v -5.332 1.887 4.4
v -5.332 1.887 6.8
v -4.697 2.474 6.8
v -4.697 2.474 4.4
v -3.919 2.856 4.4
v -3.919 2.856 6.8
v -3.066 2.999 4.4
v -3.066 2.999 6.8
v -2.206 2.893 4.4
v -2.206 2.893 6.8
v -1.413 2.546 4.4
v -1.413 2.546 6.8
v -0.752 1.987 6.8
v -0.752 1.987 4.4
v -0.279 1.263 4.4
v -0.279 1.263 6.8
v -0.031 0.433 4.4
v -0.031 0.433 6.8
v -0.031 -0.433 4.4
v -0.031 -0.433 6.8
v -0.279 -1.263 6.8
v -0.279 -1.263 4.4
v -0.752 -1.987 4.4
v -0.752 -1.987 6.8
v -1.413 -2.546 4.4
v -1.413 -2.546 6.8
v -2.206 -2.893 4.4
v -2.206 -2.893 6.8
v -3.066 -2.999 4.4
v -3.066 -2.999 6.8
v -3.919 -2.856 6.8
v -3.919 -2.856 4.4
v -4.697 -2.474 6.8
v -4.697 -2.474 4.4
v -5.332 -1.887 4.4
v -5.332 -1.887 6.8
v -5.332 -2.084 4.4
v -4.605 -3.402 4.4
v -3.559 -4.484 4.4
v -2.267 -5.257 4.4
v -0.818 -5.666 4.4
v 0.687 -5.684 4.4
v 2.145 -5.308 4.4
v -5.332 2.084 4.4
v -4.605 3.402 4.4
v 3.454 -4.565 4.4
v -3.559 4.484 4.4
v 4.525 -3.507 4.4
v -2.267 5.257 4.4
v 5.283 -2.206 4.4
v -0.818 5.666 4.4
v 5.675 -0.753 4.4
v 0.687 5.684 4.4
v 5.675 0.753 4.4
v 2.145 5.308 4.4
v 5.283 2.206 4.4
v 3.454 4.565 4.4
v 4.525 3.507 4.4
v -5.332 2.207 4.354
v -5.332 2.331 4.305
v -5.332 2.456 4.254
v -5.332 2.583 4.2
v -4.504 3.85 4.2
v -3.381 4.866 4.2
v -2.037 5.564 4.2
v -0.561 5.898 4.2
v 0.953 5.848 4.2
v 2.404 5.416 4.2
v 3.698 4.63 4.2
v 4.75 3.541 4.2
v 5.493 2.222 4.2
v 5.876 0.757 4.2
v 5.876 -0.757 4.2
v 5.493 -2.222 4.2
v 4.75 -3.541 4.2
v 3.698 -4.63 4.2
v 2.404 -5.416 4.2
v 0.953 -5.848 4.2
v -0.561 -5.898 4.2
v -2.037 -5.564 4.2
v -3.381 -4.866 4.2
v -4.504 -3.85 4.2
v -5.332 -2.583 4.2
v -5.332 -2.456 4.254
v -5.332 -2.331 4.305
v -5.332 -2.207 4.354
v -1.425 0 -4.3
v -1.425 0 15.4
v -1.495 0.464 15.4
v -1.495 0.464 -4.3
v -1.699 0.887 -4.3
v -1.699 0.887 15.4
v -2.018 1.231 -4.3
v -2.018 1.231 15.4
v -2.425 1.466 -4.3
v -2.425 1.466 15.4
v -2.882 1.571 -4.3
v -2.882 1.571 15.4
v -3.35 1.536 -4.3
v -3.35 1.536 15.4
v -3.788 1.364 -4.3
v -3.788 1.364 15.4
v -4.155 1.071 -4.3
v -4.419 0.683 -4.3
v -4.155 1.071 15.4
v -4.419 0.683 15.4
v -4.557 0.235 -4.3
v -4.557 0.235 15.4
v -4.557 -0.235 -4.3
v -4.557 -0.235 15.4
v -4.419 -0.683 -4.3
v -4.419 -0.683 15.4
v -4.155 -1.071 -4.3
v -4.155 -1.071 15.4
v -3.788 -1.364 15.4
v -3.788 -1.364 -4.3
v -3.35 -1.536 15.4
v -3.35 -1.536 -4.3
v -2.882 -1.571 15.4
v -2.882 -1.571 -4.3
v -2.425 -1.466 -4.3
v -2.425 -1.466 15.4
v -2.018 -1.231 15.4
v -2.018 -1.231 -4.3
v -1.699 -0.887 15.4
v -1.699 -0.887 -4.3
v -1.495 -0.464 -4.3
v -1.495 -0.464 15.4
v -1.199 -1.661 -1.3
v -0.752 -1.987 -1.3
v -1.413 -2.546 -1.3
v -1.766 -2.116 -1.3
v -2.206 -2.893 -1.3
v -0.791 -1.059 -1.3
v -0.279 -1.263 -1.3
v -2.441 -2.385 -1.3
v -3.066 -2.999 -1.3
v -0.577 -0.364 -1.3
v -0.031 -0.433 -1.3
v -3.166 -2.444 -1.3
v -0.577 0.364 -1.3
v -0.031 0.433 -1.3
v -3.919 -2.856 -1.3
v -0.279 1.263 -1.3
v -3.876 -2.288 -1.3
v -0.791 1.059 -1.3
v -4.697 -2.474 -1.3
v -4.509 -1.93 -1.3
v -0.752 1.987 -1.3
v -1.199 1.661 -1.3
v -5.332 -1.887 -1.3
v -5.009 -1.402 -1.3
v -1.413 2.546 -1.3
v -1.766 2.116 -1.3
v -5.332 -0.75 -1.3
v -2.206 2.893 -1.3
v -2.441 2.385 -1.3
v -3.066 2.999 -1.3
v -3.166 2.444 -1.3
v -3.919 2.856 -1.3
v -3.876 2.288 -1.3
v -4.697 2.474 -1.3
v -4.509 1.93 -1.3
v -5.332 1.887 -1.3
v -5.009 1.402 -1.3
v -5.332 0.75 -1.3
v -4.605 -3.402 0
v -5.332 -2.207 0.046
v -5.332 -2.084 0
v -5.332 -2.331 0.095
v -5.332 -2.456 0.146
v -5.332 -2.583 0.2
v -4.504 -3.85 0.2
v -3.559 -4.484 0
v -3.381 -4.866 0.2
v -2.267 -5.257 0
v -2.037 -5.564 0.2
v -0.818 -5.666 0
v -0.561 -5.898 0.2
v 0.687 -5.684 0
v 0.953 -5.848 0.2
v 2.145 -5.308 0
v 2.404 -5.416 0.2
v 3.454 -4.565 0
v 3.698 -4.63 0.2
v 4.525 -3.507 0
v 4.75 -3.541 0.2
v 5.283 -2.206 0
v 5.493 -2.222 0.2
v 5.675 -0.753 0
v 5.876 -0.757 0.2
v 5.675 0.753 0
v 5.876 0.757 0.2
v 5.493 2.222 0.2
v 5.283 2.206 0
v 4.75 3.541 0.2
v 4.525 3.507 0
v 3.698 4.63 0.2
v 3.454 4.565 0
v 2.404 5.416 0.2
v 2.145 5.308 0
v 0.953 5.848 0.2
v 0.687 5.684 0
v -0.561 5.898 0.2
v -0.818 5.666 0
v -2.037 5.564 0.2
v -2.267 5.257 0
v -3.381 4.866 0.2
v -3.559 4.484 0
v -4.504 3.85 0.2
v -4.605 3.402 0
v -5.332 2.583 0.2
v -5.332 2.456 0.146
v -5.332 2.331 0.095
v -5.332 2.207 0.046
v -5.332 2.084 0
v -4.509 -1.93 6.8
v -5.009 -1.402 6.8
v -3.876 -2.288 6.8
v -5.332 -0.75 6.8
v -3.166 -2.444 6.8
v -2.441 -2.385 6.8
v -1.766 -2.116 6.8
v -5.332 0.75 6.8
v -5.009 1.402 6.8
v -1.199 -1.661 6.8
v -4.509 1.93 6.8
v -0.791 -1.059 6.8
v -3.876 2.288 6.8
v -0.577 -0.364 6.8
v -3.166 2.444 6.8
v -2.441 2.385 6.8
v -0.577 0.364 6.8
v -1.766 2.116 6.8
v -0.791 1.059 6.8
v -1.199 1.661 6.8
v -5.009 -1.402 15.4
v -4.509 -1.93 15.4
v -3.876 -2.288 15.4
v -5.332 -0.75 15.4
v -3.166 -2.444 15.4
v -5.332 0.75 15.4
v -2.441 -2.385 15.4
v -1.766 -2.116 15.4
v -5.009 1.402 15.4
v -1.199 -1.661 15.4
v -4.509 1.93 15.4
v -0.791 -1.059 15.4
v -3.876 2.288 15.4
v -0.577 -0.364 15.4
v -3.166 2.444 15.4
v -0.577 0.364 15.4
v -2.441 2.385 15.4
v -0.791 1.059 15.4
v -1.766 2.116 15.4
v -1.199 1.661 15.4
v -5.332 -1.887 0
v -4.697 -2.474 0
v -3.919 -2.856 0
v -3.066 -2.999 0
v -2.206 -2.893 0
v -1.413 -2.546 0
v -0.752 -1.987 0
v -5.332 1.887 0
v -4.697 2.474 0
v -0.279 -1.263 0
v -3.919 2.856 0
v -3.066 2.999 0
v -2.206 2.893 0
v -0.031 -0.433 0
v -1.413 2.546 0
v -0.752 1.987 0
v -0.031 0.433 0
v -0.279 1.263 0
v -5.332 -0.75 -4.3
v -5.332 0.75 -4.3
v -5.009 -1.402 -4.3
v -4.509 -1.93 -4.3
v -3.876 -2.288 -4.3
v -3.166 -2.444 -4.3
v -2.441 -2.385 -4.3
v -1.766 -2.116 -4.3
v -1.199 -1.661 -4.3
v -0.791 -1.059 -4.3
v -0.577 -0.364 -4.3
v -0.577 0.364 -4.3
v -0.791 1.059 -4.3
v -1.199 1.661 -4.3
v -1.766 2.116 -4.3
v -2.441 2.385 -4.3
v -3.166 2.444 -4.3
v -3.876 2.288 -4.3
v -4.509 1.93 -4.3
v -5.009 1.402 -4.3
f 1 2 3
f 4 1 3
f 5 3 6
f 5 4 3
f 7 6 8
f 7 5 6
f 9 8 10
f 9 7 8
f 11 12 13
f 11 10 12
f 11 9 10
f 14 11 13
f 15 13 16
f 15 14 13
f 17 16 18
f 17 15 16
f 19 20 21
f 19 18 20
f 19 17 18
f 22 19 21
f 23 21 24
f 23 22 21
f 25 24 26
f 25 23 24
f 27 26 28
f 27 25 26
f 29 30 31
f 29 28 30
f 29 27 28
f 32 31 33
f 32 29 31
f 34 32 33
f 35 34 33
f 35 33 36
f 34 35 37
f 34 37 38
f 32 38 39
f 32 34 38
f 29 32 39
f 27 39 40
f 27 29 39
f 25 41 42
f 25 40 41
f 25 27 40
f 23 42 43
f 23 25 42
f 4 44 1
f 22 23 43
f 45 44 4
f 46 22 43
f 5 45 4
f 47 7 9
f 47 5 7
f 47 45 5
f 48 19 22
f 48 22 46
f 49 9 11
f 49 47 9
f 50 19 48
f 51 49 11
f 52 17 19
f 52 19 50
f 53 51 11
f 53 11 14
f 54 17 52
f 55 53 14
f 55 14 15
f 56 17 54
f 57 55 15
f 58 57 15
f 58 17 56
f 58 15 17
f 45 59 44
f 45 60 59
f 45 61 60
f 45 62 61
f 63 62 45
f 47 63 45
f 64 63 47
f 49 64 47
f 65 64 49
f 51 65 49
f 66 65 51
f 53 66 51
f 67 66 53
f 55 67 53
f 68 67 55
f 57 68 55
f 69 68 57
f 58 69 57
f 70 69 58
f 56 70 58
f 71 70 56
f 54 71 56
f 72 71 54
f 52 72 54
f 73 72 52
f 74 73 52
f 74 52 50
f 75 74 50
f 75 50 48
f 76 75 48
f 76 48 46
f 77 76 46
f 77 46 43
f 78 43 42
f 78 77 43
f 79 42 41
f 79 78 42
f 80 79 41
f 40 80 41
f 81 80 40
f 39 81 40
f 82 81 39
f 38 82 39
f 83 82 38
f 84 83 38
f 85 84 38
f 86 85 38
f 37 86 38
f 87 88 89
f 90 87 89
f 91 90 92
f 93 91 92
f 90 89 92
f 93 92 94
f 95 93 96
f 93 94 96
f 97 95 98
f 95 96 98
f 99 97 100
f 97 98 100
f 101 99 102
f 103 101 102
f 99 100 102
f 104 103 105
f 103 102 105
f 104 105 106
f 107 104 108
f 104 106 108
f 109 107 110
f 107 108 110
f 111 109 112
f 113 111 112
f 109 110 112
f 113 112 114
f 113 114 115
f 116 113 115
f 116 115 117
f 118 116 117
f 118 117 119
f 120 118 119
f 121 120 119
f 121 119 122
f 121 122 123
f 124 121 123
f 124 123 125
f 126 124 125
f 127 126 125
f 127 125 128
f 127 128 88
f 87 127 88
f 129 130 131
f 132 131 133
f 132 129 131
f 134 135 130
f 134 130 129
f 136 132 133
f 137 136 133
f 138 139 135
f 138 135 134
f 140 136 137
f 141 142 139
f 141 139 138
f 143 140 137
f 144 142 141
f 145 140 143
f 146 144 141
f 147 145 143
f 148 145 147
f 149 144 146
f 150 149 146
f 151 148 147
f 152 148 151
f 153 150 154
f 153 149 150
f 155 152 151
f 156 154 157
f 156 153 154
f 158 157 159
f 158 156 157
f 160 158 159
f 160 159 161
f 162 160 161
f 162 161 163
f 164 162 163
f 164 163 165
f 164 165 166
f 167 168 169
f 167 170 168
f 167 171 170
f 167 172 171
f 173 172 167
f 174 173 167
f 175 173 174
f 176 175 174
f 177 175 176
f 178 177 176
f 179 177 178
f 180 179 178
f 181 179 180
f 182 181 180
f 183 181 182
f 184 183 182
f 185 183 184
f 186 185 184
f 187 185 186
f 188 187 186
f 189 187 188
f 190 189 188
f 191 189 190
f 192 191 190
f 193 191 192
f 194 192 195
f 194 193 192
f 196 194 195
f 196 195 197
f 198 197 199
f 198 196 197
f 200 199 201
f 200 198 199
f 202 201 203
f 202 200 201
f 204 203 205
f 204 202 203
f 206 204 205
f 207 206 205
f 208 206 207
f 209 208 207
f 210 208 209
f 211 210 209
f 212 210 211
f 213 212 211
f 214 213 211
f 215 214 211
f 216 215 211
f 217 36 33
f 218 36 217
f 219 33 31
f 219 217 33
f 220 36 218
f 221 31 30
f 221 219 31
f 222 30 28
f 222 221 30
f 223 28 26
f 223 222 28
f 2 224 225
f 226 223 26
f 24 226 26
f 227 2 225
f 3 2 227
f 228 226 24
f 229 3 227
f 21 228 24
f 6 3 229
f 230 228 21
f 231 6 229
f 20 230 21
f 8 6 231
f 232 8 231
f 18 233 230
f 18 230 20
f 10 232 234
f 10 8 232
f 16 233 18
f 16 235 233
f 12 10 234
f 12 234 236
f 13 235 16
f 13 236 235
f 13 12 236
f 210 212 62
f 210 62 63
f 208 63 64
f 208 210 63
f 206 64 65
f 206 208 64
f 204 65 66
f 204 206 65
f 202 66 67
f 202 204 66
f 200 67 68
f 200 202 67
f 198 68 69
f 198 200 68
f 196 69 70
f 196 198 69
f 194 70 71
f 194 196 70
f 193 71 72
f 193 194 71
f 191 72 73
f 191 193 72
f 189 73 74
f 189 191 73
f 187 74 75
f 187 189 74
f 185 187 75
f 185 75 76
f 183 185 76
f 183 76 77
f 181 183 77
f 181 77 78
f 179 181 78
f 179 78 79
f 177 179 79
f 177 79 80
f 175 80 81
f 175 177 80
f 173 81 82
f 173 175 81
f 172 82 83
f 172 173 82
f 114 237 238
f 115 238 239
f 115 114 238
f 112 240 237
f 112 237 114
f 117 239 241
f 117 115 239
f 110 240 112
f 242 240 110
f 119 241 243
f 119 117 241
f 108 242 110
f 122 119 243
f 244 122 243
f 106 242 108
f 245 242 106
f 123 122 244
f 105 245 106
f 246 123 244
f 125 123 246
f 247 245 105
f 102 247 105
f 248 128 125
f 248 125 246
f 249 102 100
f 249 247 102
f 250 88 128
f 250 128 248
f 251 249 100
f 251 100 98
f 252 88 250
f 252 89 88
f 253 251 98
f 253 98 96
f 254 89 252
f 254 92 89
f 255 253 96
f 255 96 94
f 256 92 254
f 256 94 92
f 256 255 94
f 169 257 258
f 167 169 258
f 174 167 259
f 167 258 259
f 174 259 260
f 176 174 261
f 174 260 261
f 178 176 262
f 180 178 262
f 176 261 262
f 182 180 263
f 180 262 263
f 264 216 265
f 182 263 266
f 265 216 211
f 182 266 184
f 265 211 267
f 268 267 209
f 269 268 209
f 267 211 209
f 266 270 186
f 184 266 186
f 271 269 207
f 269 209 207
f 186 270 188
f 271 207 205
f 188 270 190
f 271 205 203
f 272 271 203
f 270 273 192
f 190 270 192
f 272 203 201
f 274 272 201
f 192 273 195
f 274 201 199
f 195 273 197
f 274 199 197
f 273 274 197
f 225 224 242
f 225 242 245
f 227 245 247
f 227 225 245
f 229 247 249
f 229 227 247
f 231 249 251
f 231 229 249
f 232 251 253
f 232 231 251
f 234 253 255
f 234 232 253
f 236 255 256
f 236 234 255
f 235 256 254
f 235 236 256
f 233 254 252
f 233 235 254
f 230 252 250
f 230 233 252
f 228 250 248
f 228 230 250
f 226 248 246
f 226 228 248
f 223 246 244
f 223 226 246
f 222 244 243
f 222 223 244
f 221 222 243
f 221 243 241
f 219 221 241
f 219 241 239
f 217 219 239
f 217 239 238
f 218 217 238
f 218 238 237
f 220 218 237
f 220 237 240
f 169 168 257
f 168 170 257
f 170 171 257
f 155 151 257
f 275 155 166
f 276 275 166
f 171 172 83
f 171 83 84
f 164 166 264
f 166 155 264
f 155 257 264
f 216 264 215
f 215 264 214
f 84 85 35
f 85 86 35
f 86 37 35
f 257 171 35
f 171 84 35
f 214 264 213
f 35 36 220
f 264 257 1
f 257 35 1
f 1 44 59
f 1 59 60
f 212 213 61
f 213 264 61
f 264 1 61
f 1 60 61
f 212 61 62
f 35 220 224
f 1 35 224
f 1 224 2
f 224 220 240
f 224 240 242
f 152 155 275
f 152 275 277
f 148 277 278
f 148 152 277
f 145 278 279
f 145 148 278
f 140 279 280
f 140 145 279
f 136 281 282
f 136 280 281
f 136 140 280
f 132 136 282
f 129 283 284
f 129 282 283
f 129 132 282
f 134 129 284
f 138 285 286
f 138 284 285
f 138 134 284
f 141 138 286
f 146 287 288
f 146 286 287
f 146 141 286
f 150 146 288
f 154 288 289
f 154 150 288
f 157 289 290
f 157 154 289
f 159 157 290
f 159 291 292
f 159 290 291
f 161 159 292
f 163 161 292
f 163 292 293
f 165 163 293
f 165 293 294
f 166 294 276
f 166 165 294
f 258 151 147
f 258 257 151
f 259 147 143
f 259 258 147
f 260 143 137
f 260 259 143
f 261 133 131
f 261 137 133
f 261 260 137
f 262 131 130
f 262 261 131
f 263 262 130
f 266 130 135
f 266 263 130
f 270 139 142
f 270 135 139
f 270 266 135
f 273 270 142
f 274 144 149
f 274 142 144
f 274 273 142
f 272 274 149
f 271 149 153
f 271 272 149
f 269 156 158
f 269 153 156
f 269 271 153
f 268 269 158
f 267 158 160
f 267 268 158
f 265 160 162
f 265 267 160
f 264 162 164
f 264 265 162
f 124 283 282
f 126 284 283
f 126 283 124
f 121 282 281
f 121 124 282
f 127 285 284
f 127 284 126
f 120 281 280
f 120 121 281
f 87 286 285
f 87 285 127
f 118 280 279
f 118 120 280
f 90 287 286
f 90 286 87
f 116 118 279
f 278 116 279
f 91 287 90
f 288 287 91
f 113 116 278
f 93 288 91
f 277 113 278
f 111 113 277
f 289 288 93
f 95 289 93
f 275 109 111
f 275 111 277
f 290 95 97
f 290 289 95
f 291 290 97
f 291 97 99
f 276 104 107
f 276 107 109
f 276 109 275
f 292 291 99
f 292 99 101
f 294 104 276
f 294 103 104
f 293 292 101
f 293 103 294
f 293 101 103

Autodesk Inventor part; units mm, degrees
ref_plane "YZ Plane" through (0, 0, 0) normal (1, 0, 0) x (0, 1, 0)
ref_plane "XZ Plane" through (0, 0, 0) normal (0, 1, 0) x (-1, 0, 0)
ref_plane "XY Plane" through (0, 0, 0) normal (0, 0, 1) x (1, 0, 0)
sketch "Sketch1" plane through (0, 0, 0) normal (0, 0, 1) x (1, 0, 0)
  circle A0 centre (0, 0) radius 5.925
  dimension "d0" = 11.85
extrude "Extrusion1" add sketch "Sketch1" along normal blind 4.4
chamfer "Chamfer1" distance 0.2 angle 45 2 edges at (-5.925, 0, 0) (-5.925, 0, 4.4)
sketch "Sketch2" plane through (0, 0, 4.4) normal (0, 0, 1) x (1, 0, 0)
  line L0 (0, 0) -> (-3, 0) construction
  circle A0 centre (-3, 0) radius 2.45
  dimension "d3" = 4.9
  dimension "d4" = 3
extrude "Extrusion2" add sketch "Sketch2" along normal blind 11
sketch "Sketch3" plane through (0, 0, 4.4) normal (0, 0, 1) x (1, 0, 0)
  circle A0 centre (-3, 0) radius 2.45 projected
  circle A1 centre (-3, 0) radius 3
  point P0 (0, 0)
  dimension "d7" = 6
extrude "Extrusion3" add sketch "Sketch3" along normal blind 2.4 and the other way blind 1.1
sketch "Sketch4" plane through (0, 0, 0) normal (0, 0, -1) x (-1, 0, 0)
  circle A0 centre (3, 0) radius 2.45 projected
  point P0 (0, 0)
extrude "Extrusion4" add sketch "Sketch4" along normal blind 4.3 and the other way blind 1.5
sketch "Sketch5" plane through (0, 0, 0) normal (0, 0, -1) x (-1, 0, 0)
  circle A0 centre (3, 0) radius 3 projected
  point P0 (0, 0)
extrude "Extrusion5" add sketch "Sketch5" along normal blind 1.3 and the other way blind 1
sketch "Sketch7" plane through (-3, 0, 15.4) normal (0, 0, 1) x (1, 0, 0)
  circle A0 centre (0, 0) radius 2.45 construction
  circle A1 centre (0, 0) radius 1.575
  point P0 (3, 0)
  dimension "d25" = 3.15
extrude "Extrusion7" cut sketch "Sketch7" against normal through all
sketch "Sketch8" plane through (-3, 0, 15.4) normal (0, 0, 1) x (1, 0, 0)
  line L0 (-2.3324, 4.9065) -> (-4.551, 4.9065)
  line L1 (-4.551, 4.9065) -> (-4.551, -6.3773)
  line L2 (-4.551, -6.3773) -> (-2.3324, -6.3773)
  line L3 (-2.3324, -6.3773) -> (-2.3324, 4.9065)
  circle A0 centre (0, 0) radius 2.45 construction
  line L4 (-2.45, -0.7065) -> (-2.45, 0.5926) construction
  circle A1 centre (0, 0) radius 2.45 projected
  point P0 (3, 0)
  point P1 (-2.3324, 0.75)
  point P2 (-2.3324, -0.75)
  dimension "d31" = 1.5
extrude "Extrusion8" cut sketch "Sketch8" against normal through all contours L3 A1 L2 L1 L0 | L3 A1 picked at (-2.3672, 0.0845)
sketch "Sketch6" plane through (-3, 0, -4.3) normal (0, 0, -1) x (-1, 0, 0)
  circle A0 centre (0, 0) radius 2.5 projected
  point P0 (-3, 0)
properties part number "camshaft"
